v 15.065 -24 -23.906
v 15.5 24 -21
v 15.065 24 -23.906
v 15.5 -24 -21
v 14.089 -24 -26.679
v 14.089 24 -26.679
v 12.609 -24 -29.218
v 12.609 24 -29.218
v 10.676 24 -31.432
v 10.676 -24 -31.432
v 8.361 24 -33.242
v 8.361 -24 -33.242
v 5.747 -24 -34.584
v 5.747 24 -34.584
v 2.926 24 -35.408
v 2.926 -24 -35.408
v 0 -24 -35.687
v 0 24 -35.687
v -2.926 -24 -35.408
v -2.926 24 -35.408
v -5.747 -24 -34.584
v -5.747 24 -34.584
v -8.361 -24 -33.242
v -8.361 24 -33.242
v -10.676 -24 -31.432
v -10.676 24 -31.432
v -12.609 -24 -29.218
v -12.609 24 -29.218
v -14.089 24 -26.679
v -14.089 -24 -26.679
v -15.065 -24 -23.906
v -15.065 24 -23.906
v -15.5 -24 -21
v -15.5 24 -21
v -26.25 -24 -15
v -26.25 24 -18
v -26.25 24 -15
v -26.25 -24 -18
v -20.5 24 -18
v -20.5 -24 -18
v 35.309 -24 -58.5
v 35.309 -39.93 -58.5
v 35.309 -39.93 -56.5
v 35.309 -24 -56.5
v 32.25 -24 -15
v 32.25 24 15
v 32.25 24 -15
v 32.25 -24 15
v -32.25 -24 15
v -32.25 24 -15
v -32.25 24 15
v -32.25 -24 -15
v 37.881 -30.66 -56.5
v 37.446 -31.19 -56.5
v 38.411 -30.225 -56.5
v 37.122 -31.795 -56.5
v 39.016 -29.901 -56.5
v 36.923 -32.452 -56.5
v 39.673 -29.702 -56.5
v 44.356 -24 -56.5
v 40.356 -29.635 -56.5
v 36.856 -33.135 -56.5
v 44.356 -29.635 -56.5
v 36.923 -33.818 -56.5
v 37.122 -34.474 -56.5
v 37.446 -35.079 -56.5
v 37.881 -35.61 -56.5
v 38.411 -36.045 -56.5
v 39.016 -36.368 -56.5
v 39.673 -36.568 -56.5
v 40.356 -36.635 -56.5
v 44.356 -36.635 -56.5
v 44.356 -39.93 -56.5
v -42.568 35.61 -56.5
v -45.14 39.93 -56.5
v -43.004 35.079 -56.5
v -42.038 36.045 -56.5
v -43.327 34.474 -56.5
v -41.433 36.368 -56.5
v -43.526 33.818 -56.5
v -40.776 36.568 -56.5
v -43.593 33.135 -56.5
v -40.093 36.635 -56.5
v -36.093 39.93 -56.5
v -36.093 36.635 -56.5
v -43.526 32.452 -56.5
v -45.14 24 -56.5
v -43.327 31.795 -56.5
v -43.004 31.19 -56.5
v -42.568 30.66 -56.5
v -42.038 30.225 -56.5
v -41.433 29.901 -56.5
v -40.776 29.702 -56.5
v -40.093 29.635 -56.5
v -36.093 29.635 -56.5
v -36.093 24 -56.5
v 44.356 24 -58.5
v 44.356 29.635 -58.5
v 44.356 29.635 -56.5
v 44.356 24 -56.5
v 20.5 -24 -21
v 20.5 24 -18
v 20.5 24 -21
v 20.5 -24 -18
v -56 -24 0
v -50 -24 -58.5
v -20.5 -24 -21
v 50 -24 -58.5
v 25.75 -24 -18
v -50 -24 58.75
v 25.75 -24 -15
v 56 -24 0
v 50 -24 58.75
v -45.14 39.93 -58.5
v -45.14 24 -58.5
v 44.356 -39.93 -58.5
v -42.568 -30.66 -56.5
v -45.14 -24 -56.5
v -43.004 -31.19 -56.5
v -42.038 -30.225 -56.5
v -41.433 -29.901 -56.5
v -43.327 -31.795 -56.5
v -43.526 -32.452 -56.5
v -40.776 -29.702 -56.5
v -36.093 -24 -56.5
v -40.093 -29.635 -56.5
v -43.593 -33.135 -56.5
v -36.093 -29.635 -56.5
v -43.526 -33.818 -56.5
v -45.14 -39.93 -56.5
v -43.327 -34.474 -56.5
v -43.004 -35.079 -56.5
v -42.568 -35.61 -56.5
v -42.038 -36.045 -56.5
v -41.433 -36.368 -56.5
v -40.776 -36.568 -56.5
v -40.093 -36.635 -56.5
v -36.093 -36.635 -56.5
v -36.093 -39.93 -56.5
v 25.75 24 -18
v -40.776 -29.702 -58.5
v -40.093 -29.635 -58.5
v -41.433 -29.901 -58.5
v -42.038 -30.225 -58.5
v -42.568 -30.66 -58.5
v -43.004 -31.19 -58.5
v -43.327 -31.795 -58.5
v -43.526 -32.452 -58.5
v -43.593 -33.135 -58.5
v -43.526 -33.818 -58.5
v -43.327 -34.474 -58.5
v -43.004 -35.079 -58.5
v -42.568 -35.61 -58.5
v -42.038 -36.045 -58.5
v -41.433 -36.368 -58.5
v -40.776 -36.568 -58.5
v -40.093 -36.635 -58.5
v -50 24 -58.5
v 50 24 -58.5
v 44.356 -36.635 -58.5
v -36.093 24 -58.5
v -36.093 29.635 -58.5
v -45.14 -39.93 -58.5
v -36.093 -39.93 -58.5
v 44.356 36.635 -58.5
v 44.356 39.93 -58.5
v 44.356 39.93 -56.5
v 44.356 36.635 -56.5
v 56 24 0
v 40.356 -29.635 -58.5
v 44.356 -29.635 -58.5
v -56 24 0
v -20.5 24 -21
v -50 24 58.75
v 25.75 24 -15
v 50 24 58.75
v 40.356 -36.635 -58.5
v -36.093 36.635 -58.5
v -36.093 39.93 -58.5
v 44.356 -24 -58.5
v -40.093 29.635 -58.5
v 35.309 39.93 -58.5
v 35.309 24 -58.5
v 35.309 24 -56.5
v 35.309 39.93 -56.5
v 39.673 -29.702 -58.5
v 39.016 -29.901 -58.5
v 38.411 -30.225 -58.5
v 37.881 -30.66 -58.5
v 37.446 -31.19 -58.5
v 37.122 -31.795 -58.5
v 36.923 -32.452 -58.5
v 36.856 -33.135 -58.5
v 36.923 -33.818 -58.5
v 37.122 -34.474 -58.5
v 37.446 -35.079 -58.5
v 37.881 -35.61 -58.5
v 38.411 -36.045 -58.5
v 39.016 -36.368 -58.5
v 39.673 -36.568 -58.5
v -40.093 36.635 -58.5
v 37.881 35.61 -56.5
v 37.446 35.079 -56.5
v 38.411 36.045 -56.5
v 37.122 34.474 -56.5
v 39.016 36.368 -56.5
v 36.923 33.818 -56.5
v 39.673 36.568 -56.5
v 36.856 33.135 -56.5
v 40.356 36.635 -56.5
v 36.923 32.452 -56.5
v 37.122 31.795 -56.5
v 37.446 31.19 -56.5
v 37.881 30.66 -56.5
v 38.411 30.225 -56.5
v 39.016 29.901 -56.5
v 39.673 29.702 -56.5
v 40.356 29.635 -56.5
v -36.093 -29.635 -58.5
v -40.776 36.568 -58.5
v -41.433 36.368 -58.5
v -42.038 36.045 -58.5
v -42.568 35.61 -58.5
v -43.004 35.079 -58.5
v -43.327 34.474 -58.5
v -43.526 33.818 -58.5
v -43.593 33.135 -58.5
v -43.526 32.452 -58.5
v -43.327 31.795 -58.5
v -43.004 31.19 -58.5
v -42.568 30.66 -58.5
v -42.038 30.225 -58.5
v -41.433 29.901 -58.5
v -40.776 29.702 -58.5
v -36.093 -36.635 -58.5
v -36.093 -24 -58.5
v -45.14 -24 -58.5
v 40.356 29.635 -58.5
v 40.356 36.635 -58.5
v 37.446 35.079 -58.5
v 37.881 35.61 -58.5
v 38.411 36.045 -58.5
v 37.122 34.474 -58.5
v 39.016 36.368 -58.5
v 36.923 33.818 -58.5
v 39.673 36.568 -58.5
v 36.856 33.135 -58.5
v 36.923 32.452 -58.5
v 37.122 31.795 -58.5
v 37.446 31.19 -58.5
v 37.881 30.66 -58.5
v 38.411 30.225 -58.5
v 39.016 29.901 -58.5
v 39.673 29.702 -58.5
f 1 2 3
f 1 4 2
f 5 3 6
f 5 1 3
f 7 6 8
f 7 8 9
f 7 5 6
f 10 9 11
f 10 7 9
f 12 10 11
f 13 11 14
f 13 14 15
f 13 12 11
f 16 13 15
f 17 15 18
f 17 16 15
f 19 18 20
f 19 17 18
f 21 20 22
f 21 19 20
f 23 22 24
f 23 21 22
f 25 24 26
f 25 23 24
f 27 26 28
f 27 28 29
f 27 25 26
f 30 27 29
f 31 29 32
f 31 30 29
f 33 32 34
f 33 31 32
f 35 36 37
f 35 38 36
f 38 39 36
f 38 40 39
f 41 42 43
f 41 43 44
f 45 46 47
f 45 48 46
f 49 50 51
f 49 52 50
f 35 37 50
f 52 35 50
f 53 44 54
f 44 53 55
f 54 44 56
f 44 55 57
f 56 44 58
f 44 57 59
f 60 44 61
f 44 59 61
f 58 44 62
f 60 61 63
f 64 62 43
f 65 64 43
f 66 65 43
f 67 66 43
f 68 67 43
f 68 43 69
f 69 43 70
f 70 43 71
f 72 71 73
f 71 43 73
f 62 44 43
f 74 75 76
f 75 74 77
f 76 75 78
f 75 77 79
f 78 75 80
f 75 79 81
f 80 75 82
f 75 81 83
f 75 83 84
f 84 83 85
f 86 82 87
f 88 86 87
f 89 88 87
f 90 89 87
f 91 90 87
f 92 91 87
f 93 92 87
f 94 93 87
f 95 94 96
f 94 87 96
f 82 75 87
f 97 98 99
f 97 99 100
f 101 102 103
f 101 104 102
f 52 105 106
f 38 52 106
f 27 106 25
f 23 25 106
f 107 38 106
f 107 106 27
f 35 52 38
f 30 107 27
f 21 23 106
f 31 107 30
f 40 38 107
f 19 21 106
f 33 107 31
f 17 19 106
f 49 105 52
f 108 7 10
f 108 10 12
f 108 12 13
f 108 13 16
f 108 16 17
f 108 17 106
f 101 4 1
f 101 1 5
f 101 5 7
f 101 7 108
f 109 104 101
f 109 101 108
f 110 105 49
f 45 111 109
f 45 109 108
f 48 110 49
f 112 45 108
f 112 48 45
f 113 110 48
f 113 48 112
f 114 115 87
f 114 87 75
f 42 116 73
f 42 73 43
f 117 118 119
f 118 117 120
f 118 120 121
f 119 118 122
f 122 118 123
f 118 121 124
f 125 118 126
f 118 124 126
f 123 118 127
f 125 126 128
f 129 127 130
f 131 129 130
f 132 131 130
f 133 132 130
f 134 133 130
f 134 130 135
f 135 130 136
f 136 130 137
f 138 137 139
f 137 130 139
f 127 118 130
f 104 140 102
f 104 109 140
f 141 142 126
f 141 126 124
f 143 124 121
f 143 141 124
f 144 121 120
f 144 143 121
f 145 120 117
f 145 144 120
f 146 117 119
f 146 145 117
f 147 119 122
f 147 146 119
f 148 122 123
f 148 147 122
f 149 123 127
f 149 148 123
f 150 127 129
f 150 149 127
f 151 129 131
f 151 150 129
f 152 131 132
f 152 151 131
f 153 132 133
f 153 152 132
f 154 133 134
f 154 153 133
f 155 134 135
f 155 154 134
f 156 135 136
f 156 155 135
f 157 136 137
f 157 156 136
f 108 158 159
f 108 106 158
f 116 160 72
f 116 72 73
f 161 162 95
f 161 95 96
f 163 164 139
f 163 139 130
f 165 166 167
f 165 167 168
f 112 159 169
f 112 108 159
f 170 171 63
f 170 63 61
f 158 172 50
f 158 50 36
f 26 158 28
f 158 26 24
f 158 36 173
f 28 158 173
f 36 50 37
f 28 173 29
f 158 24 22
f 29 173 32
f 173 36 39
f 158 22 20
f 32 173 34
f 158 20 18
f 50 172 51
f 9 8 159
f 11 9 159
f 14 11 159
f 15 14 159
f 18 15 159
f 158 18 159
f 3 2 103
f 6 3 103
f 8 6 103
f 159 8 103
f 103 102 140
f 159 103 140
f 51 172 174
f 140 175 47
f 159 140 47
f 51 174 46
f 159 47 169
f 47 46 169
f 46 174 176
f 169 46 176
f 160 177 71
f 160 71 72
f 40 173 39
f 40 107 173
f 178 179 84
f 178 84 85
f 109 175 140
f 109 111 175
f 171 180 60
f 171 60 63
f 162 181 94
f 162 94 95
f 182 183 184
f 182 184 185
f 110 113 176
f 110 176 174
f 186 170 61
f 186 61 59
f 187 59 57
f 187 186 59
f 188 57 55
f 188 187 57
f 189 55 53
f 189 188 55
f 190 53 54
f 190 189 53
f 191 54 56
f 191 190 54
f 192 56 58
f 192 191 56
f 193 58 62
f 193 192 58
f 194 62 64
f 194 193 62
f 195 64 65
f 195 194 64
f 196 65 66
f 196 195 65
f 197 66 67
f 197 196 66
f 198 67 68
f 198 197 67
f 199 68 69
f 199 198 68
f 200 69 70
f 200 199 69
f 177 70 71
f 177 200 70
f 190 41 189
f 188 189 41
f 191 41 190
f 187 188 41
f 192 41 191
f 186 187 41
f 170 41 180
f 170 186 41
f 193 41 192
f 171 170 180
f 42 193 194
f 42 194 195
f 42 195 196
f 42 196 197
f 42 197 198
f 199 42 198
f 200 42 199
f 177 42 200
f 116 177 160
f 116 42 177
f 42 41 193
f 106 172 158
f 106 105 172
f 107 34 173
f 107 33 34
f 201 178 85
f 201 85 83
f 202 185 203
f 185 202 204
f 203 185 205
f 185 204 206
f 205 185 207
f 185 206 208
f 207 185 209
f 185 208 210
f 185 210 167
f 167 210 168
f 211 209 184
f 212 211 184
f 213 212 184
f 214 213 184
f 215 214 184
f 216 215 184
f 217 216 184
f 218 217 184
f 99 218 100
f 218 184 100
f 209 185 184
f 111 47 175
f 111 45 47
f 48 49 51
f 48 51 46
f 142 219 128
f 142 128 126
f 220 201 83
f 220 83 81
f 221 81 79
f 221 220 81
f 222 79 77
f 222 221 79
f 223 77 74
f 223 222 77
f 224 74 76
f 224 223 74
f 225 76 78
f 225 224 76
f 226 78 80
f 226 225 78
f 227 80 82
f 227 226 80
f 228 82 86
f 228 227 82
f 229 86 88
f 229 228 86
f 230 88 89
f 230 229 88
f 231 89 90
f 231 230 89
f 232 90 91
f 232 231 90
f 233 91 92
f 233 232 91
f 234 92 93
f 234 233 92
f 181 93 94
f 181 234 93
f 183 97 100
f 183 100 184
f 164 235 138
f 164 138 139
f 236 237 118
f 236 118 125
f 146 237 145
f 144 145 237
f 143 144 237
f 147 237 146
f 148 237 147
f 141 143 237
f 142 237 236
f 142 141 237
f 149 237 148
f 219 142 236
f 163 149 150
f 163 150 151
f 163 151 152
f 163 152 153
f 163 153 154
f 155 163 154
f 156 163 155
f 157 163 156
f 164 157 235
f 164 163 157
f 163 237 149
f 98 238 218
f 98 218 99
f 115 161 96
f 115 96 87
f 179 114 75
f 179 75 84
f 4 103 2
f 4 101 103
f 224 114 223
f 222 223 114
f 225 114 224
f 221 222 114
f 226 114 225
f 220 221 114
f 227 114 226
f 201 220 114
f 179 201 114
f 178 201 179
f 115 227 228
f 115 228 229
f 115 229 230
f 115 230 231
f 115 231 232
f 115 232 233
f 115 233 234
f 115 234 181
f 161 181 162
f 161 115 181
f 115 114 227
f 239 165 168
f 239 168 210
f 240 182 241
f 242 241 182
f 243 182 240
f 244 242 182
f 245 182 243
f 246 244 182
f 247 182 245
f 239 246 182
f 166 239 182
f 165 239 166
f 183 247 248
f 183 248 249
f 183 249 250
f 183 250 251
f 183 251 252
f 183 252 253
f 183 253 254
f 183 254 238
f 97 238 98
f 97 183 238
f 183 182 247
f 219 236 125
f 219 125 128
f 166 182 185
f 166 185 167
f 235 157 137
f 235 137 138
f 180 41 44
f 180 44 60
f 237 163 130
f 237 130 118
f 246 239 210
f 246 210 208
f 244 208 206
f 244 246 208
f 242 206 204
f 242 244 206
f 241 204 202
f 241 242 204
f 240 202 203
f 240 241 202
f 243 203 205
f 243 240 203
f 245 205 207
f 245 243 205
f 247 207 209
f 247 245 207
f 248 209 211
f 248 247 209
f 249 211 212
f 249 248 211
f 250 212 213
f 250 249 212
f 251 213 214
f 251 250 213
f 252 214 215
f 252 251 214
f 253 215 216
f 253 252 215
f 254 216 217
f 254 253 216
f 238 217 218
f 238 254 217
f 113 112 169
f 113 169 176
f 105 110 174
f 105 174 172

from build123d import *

# Parameters (mm, degrees)
F1_DEPTH = 24
F3_DEPTH = 2
F4_DEPTH = 24
F5_DEPTH = 5


# Not quite as in the source:
# - a feature names something its author has since deleted; it is built from what else it names


with BuildPart() as f1:
    # F0 (on Front) → F1 (new body, symmetric)
    with BuildSketch(Plane.XZ):
        Polygon((-40, -58.5), (0, -58.5), (40, -58.5), (50, -58.5), (56, 0), (50, 58.75), (0, 58.75), (-50, 58.75), (-56, 0), (-50, -58.5), align=None)
        with BuildLine():
            Line((-32.25, 15), (0, 15))
            Line((0, 15), (32.25, 15))
            Line((32.25, 15), (32.25, -15))
            Line((32.25, -15), (25.75, -15))
            Line((25.75, -15), (25.75, -18))
            Line((25.75, -18), (20.5, -18))
            Line((20.5, -18), (20.5, -21))
            Line((20.5, -21), (15.5, -21))
            ThreePointArc((15.5, -21), (0, -35.6865517328), (-15.5, -21))
            Line((-15.5, -21), (-20.5, -21))
            Line((-20.5, -21), (-20.5, -18))
            Line((-20.5, -18), (-26.25, -18))
            Line((-26.25, -18), (-26.25, -15))
            Line((-26.25, -15), (-32.25, -15))
            Line((-32.25, -15), (-32.25, 15))
        make_face(mode=Mode.SUBTRACT)
    extrude(amount=F1_DEPTH, both=True)

    # F0 (on Front) → F4 (cut, symmetric)
    with BuildSketch(Plane.XZ):
        with BuildLine():
            Line((32.25, 15), (0, 15))
            Line((0, 15), (-32.25, 15))
            Line((-32.25, 15), (-32.25, -15))
            Line((-32.25, -15), (-26.25, -15))
            Line((-26.25, -15), (-26.25, -18))
            Line((-26.25, -18), (-20.5, -18))
            Line((-20.5, -18), (-20.5, -21))
            Line((-20.5, -21), (-15.5, -21))
            ThreePointArc((-15.5, -21), (0, -35.6865517328), (15.5, -21))
            Line((15.5, -21), (20.5, -21))
            Line((20.5, -21), (20.5, -18))
            Line((20.5, -18), (25.75, -18))
            Line((25.75, -18), (25.75, -15))
            Line((25.75, -15), (32.25, -15))
            Line((32.25, -15), (32.25, 15))
        make_face()
    extrude(amount=F4_DEPTH, both=True, mode=Mode.SUBTRACT)

    # F2 (on face) → F5 (cut)
    with BuildSketch(Plane(origin=(0, 0, -58.5), x_dir=(1, 0, 0), z_dir=(0, 0, -1))):
        with BuildLine():
            Line((-40.0934517384, -33.1348065302), (-40.0934517384, -29.6348065302))
            ThreePointArc((-40.0934517384, -29.6348065302), (-43.5934517384, -33.1348065302), (-40.0934517384, -36.6348065302))
            Line((-40.0934517384, -36.6348065302), (-40.0934517384, -33.1348065302))
        make_face()
        with BuildLine():
            ThreePointArc((-36.5934517384, -33.1348065302), (-37.6185780042, -30.659932796), (-40.0934517384, -29.6348065302))
            Line((-40.0934517384, -29.6348065302), (-40.0934517384, -33.1348065302))
            Line((-40.0934517384, -33.1348065302), (-40.0934517384, -36.6348065302))
            ThreePointArc((-40.0934517384, -36.6348065302), (-37.6185780042, -35.6096802643), (-36.5934517384, -33.1348065302))
        make_face()
        with BuildLine():
            Line((-36.0934517384, -36.6348065302), (-36.0934517384, -29.6348065302))
            Line((-36.0934517384, -29.6348065302), (-40.0934517384, -29.6348065302))
            ThreePointArc((-40.0934517384, -29.6348065302), (-37.6185780042, -30.659932796), (-36.5934517384, -33.1348065302))
            ThreePointArc((-36.5934517384, -33.1348065302), (-37.6185780042, -35.6096802643), (-40.0934517384, -36.6348065302))
            Line((-40.0934517384, -36.6348065302), (-36.0934517384, -36.6348065302))
        make_face()
        with BuildLine():
            ThreePointArc((-40.0934517384, 36.6348065302), (-43.5934517384, 33.1348065302), (-40.0934517384, 29.6348065302))
            Line((-40.0934517384, 29.6348065302), (-40.0934517384, 33.1348065302))
            Line((-40.0934517384, 33.1348065302), (-40.0934517384, 36.6348065302))
        make_face()
        with BuildLine():
            Line((-40.0934517384, 33.1348065302), (-40.0934517384, 29.6348065302))
            ThreePointArc((-40.0934517384, 29.6348065302), (-37.6185780042, 30.659932796), (-36.5934517384, 33.1348065302))
            ThreePointArc((-36.5934517384, 33.1348065302), (-37.6185780042, 35.6096802643), (-40.0934517384, 36.6348065302))
            Line((-40.0934517384, 36.6348065302), (-40.0934517384, 33.1348065302))
        make_face()
        with BuildLine():
            Line((-40.0934517384, 29.6348065302), (-36.0934517384, 29.6348065302))
            Line((-36.0934517384, 29.6348065302), (-36.0934517384, 36.6348065302))
            Line((-36.0934517384, 36.6348065302), (-40.0934517384, 36.6348065302))
            ThreePointArc((-40.0934517384, 36.6348065302), (-37.6185780042, 35.6096802643), (-36.5934517384, 33.1348065302))
            ThreePointArc((-36.5934517384, 33.1348065302), (-37.6185780042, 30.659932796), (-40.0934517384, 29.6348065302))
        make_face()
        with BuildLine():
            Line((40.3557159007, -36.6348065302), (44.3557159007, -36.6348065302))
            Line((44.3557159007, -36.6348065302), (44.3557159007, -29.6348065302))
            Line((44.3557159007, -29.6348065302), (40.3557159007, -29.6348065302))
            ThreePointArc((40.3557159007, -29.6348065302), (42.8305896348, -30.659932796), (43.8557159007, -33.1348065302))
            ThreePointArc((43.8557159007, -33.1348065302), (42.8305896348, -35.6096802643), (40.3557159007, -36.6348065302))
        make_face()
        with BuildLine():
            Line((40.3557159007, -33.1348065302), (40.3557159007, -36.6348065302))
            ThreePointArc((40.3557159007, -36.6348065302), (42.8305896348, -35.6096802643), (43.8557159007, -33.1348065302))
            ThreePointArc((43.8557159007, -33.1348065302), (42.8305896348, -30.659932796), (40.3557159007, -29.6348065302))
            Line((40.3557159007, -29.6348065302), (40.3557159007, -33.1348065302))
        make_face()
        with BuildLine():
            ThreePointArc((40.3557159007, -29.6348065302), (36.8557159007, -33.1348065302), (40.3557159007, -36.6348065302))
            Line((40.3557159007, -36.6348065302), (40.3557159007, -33.1348065302))
            Line((40.3557159007, -33.1348065302), (40.3557159007, -29.6348065302))
        make_face()
        with BuildLine():
            ThreePointArc((40.3557159007, 36.6348065302), (36.8557159007, 33.1348065302), (40.3557159007, 29.6348065302))
            Line((40.3557159007, 29.6348065302), (40.3557159007, 33.1348065302))
            Line((40.3557159007, 33.1348065302), (40.3557159007, 36.6348065302))
        make_face()
        with BuildLine():
            Line((40.3557159007, 33.1348065302), (40.3557159007, 29.6348065302))
            ThreePointArc((40.3557159007, 29.6348065302), (42.8305896348, 30.659932796), (43.8557159007, 33.1348065302))
            ThreePointArc((43.8557159007, 33.1348065302), (42.8305896348, 35.6096802643), (40.3557159007, 36.6348065302))
            Line((40.3557159007, 36.6348065302), (40.3557159007, 33.1348065302))
        make_face()
        with BuildLine():
            Line((40.3557159007, 29.6348065302), (44.3557159007, 29.6348065302))
            Line((44.3557159007, 29.6348065302), (44.3557159007, 36.6348065302))
            Line((44.3557159007, 36.6348065302), (40.3557159007, 36.6348065302))
            ThreePointArc((40.3557159007, 36.6348065302), (42.8305896348, 35.6096802643), (43.8557159007, 33.1348065302))
            ThreePointArc((43.8557159007, 33.1348065302), (42.8305896348, 30.659932796), (40.3557159007, 29.6348065302))
        make_face()
    extrude(amount=-F5_DEPTH, mode=Mode.SUBTRACT)


with BuildPart() as f3:
    # F2 (on face) → F3 (new body)
    with BuildSketch(Plane(origin=(0, 0, -58.5), x_dir=(1, 0, 0), z_dir=(0, 0, -1))):
        with BuildLine():
            Line((-45.1397926509, 39.9301091), (-45.1397926509, 24))
            Line((-45.1397926509, 24), (-36.0934517384, 24))
            Line((-36.0934517384, 24), (-36.0934517384, 29.6348065302))
            Line((-36.0934517384, 29.6348065302), (-40.0934517384, 29.6348065302))
            ThreePointArc((-40.0934517384, 29.6348065302), (-43.5934517384, 33.1348065302), (-40.0934517384, 36.6348065302))
            Line((-40.0934517384, 36.6348065302), (-36.0934517384, 36.6348065302))
            Line((-36.0934517384, 36.6348065302), (-36.0934517384, 39.9301091))
            Line((-36.0934517384, 39.9301091), (-45.1397926509, 39.9301091))
        make_face()
    extrude(amount=-F3_DEPTH)


with BuildPart() as f3b:
    # F2 (on face) → F3, piece 2 (new body)
    with BuildSketch(Plane(origin=(0, 0, -58.5), x_dir=(1, 0, 0), z_dir=(0, 0, -1))):
        with BuildLine():
            Line((35.3093749881, -39.9301091), (44.3557159007, -39.9301091))
            Line((44.3557159007, -39.9301091), (44.3557159007, -36.6348065302))
            Line((44.3557159007, -36.6348065302), (40.3557159007, -36.6348065302))
            ThreePointArc((40.3557159007, -36.6348065302), (36.8557159007, -33.1348065302), (40.3557159007, -29.6348065302))
            Line((40.3557159007, -29.6348065302), (44.3557159007, -29.6348065302))
            Line((44.3557159007, -29.6348065302), (44.3557159007, -24))
            Line((44.3557159007, -24), (35.3093749881, -24))
            Line((35.3093749881, -24), (35.3093749881, -39.9301091))
        make_face()
    extrude(amount=-F3_DEPTH)


with BuildPart() as f3c:
    # F2 (on face) → F3, piece 3 (new body)
    with BuildSketch(Plane(origin=(0, 0, -58.5), x_dir=(1, 0, 0), z_dir=(0, 0, -1))):
        with BuildLine():
            Line((-36.0934517384, -29.6348065302), (-36.0934517384, -24))
            Line((-36.0934517384, -24), (-45.1397926509, -24))
            Line((-45.1397926509, -24), (-45.1397926509, -39.9301091))
            Line((-45.1397926509, -39.9301091), (-36.0934517384, -39.9301091))
            Line((-36.0934517384, -39.9301091), (-36.0934517384, -36.6348065302))
            Line((-36.0934517384, -36.6348065302), (-40.0934517384, -36.6348065302))
            ThreePointArc((-40.0934517384, -36.6348065302), (-43.5934517384, -33.1348065302), (-40.0934517384, -29.6348065302))
            Line((-40.0934517384, -29.6348065302), (-36.0934517384, -29.6348065302))
        make_face()
    extrude(amount=-F3_DEPTH)


with BuildPart() as f3d:
    # F2 (on face) → F3, piece 4 (new body)
    with BuildSketch(Plane(origin=(0, 0, -58.5), x_dir=(1, 0, 0), z_dir=(0, 0, -1))):
        with BuildLine():
            Line((35.3093749881, 24), (44.3557159007, 24))
            Line((44.3557159007, 24), (44.3557159007, 29.6348065302))
            Line((44.3557159007, 29.6348065302), (40.3557159007, 29.6348065302))
            ThreePointArc((40.3557159007, 29.6348065302), (36.8557159007, 33.1348065302), (40.3557159007, 36.6348065302))
            Line((40.3557159007, 36.6348065302), (44.3557159007, 36.6348065302))
            Line((44.3557159007, 36.6348065302), (44.3557159007, 39.9301091))
            Line((44.3557159007, 39.9301091), (35.3093749881, 39.9301091))
            Line((35.3093749881, 39.9301091), (35.3093749881, 24))
        make_face()
    extrude(amount=-F3_DEPTH)


solid = Compound([f1.part, f3.part, f3b.part, f3c.part, f3d.part])
